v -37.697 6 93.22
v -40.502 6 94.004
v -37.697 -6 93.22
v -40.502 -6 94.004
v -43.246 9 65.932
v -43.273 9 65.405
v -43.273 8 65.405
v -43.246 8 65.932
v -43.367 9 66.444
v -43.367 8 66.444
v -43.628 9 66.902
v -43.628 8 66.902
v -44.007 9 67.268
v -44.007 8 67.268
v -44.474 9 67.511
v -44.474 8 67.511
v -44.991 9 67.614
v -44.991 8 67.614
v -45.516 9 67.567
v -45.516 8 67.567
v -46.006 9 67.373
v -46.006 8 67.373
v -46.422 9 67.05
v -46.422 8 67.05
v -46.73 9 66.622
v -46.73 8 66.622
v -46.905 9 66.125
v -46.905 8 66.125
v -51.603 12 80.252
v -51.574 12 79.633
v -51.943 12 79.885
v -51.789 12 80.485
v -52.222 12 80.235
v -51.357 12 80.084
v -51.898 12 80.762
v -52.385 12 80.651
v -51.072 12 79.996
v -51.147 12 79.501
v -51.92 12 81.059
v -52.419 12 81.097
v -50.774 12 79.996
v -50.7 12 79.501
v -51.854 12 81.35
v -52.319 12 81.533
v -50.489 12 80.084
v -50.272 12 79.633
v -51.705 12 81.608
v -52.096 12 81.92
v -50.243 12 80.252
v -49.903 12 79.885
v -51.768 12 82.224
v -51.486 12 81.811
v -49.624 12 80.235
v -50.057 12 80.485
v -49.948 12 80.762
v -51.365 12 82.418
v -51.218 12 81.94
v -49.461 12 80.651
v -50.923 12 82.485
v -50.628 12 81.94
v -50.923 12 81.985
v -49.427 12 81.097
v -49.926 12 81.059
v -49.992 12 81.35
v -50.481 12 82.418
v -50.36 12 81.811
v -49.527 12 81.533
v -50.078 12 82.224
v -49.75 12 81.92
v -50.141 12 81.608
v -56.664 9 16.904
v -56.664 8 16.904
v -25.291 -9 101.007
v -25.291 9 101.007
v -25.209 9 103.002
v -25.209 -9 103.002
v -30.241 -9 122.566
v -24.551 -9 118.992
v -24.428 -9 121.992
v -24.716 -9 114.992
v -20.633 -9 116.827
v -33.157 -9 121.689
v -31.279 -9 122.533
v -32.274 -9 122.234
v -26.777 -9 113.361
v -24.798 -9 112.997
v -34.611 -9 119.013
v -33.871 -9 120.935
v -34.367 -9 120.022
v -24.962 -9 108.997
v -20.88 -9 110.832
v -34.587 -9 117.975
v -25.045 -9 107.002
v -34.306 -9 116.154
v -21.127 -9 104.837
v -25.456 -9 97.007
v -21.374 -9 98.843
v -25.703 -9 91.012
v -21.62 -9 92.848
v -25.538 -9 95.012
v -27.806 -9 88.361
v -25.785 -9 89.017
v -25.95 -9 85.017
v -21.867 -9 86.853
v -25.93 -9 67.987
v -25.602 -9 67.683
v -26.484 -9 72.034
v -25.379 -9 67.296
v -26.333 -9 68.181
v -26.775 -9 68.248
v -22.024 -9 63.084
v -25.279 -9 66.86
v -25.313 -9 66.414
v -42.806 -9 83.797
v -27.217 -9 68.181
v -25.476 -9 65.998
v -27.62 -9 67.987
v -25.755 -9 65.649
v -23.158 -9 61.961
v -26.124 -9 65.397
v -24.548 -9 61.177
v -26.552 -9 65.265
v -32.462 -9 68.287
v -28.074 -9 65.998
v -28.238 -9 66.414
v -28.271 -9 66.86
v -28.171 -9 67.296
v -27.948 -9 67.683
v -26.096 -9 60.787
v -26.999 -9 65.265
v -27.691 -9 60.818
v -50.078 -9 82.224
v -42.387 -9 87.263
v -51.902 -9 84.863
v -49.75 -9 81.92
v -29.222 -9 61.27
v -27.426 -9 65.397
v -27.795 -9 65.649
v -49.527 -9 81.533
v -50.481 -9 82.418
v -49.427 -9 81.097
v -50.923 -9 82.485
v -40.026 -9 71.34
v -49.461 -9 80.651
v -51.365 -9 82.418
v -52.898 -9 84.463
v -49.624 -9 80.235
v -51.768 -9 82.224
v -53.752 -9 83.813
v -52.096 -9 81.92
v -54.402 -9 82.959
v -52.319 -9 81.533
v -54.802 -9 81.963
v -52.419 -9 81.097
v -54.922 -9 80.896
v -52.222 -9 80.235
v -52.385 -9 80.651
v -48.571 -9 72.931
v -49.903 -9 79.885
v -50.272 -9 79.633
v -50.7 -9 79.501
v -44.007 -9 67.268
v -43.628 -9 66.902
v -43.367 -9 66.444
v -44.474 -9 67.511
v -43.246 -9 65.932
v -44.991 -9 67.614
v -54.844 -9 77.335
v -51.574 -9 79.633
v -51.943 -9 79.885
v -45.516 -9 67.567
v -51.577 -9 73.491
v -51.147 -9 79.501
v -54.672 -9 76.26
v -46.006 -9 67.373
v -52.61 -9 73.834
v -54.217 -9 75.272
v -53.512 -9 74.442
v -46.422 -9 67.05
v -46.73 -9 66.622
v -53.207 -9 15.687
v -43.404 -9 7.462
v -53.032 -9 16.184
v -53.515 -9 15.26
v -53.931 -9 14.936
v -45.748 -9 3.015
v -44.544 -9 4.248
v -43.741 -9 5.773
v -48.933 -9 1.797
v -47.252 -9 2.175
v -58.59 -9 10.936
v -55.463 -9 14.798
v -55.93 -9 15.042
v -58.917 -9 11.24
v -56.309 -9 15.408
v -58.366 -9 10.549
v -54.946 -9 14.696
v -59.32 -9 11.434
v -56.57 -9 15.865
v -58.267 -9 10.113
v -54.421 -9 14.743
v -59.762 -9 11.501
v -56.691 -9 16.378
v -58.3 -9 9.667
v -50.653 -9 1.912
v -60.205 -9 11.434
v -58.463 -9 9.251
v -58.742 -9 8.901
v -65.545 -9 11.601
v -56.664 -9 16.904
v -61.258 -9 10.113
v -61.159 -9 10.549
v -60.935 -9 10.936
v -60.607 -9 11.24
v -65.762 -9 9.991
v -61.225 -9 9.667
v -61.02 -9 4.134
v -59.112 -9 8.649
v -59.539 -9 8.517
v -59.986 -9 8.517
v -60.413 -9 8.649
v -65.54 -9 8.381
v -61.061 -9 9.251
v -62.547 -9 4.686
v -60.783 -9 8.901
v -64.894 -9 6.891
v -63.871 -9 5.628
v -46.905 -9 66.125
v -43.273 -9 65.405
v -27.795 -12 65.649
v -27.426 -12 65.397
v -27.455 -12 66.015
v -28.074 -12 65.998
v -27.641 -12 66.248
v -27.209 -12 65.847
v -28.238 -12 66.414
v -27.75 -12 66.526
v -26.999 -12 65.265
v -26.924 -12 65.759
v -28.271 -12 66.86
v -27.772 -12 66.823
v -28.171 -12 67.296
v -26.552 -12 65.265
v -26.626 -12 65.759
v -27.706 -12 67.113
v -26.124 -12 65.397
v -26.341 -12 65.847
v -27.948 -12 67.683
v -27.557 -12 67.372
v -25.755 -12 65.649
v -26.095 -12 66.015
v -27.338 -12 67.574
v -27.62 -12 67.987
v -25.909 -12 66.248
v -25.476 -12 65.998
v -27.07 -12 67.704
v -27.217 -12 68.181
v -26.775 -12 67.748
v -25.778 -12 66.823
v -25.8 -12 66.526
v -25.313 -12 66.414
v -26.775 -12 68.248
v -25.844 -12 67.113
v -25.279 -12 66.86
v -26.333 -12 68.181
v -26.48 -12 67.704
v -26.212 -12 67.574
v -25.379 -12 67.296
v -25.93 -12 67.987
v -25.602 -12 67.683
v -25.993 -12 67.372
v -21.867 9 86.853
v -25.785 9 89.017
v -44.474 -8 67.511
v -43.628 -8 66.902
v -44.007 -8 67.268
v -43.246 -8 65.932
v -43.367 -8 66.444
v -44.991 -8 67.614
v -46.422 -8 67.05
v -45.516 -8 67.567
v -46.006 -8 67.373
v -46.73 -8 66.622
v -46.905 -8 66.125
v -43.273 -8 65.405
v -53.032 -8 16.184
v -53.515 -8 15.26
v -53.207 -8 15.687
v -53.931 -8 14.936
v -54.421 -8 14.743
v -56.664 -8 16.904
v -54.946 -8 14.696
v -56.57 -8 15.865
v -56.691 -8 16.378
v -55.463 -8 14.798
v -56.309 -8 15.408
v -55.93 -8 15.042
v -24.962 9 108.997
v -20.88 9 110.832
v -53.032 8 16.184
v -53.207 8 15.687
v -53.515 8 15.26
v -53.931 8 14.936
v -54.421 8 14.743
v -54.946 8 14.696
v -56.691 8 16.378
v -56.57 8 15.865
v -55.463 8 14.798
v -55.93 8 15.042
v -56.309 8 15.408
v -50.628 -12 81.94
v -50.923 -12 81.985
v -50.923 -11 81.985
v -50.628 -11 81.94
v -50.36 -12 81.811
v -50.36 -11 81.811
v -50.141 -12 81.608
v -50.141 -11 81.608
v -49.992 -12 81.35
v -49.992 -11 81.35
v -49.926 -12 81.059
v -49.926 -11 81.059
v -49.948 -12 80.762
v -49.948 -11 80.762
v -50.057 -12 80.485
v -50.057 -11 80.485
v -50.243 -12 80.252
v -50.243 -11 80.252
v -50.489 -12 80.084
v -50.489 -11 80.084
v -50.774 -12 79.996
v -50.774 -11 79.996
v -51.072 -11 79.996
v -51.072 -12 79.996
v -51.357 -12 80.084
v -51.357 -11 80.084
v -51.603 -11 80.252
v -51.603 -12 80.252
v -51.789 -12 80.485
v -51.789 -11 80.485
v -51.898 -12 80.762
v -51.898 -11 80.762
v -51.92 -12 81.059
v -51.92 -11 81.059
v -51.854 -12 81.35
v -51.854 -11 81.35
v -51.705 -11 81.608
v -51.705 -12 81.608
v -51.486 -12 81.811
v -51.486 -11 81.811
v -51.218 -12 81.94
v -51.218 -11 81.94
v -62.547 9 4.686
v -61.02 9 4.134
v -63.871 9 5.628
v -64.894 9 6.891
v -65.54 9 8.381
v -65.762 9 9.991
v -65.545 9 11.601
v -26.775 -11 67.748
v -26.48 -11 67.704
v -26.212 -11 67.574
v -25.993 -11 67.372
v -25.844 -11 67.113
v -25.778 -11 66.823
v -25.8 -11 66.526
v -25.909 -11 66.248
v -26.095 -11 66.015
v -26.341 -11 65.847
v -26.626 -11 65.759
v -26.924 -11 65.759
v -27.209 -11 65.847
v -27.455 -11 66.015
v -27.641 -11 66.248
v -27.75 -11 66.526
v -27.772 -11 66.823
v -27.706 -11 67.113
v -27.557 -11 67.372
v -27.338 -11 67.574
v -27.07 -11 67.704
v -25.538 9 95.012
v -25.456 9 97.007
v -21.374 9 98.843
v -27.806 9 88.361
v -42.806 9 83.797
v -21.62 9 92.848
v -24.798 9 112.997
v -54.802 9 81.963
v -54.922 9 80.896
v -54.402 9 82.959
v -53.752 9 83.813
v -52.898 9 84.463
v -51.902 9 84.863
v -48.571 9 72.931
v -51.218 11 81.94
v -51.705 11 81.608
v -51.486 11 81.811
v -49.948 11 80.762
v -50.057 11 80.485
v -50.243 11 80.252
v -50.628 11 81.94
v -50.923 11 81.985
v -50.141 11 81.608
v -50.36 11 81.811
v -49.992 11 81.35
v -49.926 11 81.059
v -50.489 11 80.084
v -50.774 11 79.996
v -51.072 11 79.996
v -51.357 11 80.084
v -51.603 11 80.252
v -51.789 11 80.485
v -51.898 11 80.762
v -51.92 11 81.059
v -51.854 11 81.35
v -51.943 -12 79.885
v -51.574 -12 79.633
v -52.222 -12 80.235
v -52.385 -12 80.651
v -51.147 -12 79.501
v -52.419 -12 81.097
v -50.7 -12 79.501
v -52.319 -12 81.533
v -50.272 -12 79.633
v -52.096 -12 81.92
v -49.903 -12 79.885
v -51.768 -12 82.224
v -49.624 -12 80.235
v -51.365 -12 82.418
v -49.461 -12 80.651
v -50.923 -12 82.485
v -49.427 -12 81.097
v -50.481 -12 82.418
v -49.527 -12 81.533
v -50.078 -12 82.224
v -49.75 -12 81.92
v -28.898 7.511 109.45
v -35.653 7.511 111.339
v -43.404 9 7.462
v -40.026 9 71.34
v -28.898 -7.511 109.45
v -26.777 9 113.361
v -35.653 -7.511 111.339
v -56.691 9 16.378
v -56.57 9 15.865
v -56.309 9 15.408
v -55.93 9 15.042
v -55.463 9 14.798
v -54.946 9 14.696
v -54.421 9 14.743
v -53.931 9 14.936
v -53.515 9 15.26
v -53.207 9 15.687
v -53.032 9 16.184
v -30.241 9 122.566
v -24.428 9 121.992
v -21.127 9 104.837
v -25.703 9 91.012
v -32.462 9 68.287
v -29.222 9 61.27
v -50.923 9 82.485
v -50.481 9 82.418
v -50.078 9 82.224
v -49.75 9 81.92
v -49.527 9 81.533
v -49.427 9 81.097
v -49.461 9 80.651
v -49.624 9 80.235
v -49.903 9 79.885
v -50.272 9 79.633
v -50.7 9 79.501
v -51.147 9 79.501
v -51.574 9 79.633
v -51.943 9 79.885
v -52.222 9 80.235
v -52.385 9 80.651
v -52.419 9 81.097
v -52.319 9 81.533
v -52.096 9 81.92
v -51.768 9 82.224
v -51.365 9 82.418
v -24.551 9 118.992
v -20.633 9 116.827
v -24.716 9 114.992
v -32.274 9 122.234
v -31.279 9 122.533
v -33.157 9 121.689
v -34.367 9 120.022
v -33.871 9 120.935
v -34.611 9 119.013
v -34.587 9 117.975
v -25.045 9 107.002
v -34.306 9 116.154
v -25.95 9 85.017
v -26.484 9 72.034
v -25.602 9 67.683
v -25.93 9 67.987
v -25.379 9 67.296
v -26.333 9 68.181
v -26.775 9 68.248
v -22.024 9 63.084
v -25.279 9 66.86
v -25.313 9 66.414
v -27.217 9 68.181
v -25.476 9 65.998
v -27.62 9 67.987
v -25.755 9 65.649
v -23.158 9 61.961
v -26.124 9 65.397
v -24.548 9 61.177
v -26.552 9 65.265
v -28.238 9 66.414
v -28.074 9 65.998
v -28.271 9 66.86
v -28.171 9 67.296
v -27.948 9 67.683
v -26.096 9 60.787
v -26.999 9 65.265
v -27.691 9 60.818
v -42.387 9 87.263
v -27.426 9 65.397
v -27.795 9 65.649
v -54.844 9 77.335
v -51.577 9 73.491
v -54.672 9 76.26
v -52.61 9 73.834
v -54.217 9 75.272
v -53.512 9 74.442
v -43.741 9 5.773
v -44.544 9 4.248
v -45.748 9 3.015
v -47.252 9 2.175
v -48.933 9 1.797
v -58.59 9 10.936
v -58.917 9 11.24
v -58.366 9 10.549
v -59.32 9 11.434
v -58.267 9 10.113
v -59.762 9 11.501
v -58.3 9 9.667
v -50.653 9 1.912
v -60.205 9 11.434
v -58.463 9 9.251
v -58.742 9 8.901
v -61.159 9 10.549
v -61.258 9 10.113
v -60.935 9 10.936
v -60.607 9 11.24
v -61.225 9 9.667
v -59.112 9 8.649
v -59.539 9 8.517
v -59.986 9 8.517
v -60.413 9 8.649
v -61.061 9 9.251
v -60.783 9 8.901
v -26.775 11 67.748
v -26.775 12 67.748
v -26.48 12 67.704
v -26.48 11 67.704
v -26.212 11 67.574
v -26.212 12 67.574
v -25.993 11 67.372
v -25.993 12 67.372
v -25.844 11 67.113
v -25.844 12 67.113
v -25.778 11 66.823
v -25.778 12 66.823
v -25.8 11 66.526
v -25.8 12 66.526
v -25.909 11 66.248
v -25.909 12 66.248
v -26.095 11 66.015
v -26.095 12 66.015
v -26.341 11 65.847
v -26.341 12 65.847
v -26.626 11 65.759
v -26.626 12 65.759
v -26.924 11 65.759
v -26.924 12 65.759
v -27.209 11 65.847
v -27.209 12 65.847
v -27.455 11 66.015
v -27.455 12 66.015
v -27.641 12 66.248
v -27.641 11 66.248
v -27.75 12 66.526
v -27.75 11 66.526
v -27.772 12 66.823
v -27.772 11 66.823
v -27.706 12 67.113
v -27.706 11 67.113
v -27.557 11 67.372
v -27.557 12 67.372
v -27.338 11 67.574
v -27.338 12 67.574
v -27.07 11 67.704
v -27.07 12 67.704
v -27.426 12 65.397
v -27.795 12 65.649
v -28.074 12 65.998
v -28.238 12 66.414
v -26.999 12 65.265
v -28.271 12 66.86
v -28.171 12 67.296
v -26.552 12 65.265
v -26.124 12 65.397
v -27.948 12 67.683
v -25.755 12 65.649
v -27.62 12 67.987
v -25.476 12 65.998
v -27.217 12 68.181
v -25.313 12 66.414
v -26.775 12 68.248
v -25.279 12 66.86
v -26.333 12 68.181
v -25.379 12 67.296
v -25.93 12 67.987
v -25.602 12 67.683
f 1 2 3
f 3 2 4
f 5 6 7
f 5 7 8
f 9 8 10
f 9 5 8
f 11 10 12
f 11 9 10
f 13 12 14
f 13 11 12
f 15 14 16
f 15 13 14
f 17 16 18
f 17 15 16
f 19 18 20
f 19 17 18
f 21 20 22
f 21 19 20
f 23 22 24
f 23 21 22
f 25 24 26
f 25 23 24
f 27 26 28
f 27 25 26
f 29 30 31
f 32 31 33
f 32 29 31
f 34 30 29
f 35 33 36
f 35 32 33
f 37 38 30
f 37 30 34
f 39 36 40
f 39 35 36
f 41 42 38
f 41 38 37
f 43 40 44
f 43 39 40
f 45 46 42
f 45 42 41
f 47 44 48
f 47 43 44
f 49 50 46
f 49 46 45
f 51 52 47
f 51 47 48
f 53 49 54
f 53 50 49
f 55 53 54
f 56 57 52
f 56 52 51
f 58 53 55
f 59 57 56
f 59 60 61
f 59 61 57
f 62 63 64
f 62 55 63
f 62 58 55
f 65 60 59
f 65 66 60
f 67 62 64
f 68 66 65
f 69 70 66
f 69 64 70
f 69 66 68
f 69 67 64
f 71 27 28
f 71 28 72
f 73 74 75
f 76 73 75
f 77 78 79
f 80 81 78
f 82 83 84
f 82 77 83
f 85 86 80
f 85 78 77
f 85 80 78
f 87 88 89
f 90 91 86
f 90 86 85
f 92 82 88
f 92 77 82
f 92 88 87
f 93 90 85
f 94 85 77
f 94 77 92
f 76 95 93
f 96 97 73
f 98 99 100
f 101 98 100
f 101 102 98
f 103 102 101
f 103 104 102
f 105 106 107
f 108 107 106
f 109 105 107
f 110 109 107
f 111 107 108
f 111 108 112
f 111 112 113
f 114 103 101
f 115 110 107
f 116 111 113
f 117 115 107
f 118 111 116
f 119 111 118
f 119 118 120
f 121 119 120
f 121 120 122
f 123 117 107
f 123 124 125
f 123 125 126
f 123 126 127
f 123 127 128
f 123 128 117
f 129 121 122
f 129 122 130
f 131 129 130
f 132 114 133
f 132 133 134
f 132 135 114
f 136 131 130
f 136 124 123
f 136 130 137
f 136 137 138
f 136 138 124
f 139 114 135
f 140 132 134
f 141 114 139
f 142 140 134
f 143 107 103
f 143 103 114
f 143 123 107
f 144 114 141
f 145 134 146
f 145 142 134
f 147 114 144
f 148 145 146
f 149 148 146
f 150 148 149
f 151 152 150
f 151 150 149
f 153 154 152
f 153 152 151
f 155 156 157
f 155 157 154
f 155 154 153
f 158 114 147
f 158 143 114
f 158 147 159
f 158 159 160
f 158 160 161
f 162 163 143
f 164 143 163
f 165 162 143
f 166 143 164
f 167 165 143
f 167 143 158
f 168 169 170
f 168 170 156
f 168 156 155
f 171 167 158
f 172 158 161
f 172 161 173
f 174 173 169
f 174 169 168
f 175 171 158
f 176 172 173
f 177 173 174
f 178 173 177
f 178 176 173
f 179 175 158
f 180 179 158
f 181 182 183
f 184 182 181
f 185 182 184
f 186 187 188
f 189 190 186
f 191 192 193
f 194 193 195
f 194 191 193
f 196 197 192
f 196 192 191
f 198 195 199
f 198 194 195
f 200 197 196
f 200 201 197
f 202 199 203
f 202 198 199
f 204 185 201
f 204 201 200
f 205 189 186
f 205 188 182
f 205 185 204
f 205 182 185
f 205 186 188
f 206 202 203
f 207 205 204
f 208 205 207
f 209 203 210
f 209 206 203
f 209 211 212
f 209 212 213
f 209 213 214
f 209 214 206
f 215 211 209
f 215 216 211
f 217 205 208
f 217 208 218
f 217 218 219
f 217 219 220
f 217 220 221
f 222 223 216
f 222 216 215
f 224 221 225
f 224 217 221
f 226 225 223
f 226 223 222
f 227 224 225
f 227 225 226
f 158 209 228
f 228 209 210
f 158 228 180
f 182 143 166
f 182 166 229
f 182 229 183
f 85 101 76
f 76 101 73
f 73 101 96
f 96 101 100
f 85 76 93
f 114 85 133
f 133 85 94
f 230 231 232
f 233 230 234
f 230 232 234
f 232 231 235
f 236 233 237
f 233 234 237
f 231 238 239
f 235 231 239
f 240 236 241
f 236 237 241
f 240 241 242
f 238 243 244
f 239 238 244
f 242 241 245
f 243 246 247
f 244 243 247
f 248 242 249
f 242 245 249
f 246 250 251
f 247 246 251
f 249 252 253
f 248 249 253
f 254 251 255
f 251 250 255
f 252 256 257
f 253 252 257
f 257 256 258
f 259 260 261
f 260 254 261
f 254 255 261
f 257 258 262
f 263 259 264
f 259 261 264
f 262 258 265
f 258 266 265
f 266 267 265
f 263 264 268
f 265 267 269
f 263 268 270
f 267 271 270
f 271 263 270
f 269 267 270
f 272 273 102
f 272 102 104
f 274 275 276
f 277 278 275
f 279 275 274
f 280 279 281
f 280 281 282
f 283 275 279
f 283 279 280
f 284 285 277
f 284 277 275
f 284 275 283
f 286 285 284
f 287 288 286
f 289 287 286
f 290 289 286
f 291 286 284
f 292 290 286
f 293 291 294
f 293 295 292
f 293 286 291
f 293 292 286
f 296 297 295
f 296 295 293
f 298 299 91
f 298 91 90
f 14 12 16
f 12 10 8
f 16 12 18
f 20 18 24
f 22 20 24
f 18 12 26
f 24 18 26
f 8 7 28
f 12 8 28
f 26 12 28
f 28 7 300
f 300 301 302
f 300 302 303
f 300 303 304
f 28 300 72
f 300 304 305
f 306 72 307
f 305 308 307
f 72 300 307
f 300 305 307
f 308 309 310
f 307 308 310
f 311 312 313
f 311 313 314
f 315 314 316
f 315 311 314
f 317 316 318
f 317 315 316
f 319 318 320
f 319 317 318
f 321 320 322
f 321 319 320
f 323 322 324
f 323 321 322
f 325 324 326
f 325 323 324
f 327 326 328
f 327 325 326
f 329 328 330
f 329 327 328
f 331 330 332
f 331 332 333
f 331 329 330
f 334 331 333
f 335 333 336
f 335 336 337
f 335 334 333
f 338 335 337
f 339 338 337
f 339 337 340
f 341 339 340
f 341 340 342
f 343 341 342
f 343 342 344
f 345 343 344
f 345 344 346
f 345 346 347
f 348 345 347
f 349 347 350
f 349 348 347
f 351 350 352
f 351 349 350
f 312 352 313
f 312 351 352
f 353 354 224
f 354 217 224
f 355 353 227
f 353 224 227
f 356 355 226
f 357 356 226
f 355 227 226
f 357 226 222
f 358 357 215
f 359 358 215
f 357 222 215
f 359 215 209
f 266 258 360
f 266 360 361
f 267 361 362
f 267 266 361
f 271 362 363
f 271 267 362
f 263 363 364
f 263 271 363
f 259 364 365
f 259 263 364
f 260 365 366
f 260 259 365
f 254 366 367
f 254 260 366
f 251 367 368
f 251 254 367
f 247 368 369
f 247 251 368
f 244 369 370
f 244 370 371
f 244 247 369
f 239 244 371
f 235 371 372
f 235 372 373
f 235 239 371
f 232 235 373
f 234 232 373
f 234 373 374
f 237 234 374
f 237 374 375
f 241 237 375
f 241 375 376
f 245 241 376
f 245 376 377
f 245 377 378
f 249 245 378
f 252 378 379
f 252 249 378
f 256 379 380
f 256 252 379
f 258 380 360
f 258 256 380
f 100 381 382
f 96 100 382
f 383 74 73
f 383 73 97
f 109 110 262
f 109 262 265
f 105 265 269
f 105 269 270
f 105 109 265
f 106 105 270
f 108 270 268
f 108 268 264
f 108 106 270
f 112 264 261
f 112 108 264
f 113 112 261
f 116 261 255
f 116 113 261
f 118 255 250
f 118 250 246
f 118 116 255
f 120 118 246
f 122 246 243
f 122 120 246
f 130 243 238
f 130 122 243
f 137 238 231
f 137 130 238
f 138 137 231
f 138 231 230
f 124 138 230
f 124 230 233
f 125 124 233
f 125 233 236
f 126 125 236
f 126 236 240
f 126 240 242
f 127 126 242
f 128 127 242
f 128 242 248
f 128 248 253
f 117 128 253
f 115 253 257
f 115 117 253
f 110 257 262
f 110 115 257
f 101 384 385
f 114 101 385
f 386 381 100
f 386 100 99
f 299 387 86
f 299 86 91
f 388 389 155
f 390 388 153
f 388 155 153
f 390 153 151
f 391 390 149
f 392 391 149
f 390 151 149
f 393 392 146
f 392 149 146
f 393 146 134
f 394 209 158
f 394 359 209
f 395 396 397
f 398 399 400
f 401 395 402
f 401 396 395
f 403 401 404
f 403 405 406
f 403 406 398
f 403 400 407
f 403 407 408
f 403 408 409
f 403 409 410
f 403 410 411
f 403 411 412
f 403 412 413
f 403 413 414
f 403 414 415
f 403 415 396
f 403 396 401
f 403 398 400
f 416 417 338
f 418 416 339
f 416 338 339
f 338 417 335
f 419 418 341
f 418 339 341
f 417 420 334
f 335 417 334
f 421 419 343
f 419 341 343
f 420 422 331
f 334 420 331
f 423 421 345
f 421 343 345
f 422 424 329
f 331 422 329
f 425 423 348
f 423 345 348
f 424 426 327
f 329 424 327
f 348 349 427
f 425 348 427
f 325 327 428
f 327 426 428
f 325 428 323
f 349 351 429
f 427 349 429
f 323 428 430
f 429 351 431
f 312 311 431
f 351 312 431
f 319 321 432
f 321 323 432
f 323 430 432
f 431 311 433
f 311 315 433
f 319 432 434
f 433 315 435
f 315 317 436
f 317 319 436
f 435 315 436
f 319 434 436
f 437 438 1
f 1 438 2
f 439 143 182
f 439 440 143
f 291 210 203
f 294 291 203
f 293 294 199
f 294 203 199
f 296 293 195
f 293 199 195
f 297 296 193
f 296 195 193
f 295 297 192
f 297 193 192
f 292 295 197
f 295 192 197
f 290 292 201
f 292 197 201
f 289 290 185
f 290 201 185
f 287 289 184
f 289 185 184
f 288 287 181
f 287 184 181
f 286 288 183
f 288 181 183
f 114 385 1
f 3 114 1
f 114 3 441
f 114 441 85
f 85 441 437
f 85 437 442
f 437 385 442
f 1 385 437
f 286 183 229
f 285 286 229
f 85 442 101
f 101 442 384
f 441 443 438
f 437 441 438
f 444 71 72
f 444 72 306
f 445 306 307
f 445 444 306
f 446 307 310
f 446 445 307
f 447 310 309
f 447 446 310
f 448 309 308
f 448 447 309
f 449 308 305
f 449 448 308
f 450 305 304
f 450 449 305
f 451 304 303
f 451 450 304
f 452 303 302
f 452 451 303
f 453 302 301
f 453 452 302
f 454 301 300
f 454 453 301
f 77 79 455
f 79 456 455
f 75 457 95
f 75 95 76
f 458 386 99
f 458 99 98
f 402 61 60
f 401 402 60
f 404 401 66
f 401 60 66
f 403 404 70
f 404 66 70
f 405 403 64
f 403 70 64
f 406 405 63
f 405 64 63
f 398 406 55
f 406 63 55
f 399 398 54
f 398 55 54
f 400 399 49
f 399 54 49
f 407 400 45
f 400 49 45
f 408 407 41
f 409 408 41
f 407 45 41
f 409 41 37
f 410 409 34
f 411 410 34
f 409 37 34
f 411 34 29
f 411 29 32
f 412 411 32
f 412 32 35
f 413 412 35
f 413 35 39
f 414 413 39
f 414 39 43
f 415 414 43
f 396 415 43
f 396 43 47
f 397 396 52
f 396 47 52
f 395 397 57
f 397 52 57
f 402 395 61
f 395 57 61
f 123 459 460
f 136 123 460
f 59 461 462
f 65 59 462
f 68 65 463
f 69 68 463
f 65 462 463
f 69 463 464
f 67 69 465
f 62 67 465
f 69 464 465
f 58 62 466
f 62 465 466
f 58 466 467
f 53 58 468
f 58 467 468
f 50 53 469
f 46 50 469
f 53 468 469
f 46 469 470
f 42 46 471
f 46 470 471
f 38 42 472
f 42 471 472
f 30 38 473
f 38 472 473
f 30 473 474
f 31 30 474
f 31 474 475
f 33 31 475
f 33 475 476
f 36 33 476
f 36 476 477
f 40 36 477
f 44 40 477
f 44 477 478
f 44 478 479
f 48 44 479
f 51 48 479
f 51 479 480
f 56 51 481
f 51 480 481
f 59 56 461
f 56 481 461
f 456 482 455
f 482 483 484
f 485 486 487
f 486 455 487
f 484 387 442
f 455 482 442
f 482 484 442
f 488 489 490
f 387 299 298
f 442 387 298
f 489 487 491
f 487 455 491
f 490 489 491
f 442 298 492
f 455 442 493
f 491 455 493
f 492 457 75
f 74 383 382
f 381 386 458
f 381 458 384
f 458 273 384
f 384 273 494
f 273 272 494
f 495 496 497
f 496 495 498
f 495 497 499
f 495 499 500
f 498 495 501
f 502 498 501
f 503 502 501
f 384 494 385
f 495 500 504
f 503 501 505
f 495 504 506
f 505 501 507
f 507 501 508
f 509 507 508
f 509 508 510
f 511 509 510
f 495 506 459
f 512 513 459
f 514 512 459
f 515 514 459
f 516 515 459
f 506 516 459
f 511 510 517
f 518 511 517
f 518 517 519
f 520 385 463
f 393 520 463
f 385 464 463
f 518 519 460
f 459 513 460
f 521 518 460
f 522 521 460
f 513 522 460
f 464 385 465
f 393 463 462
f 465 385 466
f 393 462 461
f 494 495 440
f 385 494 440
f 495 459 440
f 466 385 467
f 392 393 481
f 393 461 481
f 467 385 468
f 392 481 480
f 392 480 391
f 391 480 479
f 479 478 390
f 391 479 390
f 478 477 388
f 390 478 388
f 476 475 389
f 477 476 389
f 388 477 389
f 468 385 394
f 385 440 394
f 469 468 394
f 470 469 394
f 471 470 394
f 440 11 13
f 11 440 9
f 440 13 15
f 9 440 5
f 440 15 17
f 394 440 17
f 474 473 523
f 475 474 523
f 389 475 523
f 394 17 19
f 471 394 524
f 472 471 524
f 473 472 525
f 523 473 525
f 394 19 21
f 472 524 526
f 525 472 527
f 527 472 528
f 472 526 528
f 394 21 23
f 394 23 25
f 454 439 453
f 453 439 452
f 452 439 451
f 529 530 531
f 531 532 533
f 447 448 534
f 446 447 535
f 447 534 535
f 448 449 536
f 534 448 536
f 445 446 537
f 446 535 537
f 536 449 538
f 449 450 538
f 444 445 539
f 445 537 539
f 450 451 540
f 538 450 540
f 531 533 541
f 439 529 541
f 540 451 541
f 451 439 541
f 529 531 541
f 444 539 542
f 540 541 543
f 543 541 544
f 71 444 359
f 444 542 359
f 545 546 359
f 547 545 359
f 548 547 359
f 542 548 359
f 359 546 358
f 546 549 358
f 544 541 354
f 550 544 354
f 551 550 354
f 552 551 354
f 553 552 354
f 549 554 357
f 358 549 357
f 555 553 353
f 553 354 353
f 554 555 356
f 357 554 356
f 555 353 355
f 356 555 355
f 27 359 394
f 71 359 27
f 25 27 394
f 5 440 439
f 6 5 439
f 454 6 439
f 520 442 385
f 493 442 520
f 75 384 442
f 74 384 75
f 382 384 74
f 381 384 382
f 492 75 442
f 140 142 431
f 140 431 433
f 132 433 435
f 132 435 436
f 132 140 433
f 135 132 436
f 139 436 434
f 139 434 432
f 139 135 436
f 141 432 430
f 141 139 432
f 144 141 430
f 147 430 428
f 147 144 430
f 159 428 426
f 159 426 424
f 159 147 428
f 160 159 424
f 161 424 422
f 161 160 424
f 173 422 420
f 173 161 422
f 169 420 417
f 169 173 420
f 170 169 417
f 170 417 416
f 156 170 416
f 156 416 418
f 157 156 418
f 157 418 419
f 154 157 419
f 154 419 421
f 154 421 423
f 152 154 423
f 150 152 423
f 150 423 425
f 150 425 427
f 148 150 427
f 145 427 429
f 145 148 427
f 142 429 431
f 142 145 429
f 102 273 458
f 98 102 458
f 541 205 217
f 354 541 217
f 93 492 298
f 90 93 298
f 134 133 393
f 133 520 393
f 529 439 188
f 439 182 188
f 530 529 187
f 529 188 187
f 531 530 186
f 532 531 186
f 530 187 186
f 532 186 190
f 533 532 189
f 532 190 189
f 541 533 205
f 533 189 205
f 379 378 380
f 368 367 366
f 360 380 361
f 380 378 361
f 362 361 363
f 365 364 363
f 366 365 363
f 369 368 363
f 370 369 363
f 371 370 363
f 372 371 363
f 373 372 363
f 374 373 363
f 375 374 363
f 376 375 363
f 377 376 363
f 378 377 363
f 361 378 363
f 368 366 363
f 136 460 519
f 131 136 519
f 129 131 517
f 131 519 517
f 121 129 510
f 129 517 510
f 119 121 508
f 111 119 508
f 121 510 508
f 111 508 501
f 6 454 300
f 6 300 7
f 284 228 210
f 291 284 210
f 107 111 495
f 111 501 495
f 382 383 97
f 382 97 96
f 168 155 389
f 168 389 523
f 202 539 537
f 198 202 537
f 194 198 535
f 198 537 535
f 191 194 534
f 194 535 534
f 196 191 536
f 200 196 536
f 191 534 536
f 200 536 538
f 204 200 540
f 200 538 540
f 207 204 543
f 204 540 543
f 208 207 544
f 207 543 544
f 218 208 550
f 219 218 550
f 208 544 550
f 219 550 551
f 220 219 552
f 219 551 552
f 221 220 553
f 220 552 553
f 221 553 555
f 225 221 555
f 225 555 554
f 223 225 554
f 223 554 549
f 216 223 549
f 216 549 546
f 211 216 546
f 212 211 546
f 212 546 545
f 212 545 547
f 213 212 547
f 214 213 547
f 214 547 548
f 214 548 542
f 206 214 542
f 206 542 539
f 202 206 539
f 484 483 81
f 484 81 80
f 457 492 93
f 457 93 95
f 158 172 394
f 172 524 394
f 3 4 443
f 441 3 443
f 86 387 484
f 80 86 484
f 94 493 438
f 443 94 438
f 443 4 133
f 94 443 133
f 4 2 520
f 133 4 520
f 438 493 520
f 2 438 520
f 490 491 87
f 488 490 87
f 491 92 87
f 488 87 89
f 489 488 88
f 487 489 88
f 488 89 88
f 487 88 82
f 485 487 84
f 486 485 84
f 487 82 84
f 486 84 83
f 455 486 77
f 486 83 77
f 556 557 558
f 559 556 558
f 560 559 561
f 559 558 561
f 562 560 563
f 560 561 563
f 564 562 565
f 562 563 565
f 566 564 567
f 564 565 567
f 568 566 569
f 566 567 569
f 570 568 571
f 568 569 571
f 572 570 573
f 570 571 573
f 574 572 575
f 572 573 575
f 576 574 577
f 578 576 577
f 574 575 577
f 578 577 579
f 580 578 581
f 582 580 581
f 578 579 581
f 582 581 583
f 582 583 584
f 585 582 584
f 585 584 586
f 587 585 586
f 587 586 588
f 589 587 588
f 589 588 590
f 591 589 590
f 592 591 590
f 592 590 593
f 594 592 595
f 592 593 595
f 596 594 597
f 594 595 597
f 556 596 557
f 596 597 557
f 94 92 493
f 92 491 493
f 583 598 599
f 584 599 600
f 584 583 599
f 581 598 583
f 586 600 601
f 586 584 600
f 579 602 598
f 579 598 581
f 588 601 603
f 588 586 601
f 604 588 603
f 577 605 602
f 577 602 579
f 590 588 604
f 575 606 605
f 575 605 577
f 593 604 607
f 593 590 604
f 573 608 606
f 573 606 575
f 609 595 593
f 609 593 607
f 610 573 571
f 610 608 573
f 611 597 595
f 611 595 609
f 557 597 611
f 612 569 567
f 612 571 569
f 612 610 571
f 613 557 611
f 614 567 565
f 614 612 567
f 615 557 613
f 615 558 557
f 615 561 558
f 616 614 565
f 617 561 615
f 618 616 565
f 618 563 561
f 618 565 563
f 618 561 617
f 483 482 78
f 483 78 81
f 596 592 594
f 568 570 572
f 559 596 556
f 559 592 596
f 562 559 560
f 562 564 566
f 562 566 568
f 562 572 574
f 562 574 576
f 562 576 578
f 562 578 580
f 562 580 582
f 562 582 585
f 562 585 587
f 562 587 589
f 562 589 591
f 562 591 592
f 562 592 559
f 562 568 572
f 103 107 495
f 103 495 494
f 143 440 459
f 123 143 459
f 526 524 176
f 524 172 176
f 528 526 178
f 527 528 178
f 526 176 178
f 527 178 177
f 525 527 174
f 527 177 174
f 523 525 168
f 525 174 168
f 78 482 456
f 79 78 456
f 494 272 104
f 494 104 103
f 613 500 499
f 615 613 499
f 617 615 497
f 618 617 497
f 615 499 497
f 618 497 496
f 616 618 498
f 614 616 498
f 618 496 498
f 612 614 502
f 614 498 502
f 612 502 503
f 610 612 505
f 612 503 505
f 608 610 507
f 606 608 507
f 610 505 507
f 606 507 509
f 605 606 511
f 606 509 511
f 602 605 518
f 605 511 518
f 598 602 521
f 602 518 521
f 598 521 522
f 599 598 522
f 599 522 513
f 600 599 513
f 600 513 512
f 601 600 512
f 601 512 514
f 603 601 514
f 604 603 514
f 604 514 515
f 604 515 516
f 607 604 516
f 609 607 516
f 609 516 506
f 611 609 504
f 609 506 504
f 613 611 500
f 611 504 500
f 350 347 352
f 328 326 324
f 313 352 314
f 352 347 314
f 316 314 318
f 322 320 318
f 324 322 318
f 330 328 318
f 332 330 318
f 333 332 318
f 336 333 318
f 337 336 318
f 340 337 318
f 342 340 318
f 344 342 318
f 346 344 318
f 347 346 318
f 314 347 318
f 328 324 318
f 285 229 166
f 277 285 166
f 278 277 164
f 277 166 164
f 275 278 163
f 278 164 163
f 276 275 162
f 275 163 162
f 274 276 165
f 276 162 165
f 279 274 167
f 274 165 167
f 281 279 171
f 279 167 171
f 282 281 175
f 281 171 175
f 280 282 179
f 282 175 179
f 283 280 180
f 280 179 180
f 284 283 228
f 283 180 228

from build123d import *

# Parameters (mm, degrees)
BOSS_EXTRUDE2_DEPTH = 9
FILLET2_R           = 6
FILLET3_R           = 4
BOSS_EXTRUDE3_DEPTH = 18
LPATTERN1_COUNT     = 6
LPATTERN1_PITCH     = 6
CUT_EXTRUDE1_DEPTH  = 26
CUT_EXTRUDE2_DEPTH  = 8
SKETCH6_R           = 1.5
CUT_EXTRUDE3_DEPTH  = 141.270424647
SKETCH7_R           = 1.5
BOSS_EXTRUDE4_DEPTH = 3
SKETCH8_R           = 1
CUT_EXTRUDE4_DEPTH  = 1
SKETCH9_R           = 1
CUT_EXTRUDE5_DEPTH  = 1
CUT_EXTRUDE6_DEPTH  = 1


with BuildPart() as part:
    # Sketch2 → Boss-Extrude2 (new, symmetric)
    with BuildSketch(Plane(origin=(0, 0, 0), x_dir=(1, 0, 0), z_dir=(0, 1, 0))):
        with BuildLine():
            ThreePointArc((-29.221908411, -61.269670629), (-25.308747509, -60.930081396), (-22.024034304, -63.083870674))
            Line((-22.024034304, -63.083870674), (-26.48393122, -72.034251644))
            Line((-26.48393122, -72.034251644), (-24.427510733, -121.991945093))
            Line((-24.427510733, -121.991945093), (-35.374328657, -123.072304919))
            Line((-35.374328657, -123.072304919), (-34.306141095, -116.154286754))
            Line((-34.306141095, -116.154286754), (-42.387240047, -87.26318363))
            Line((-42.387240047, -87.26318363), (-54.992342236, -84.083341057))
            Line((-54.992342236, -84.083341057), (-54.772056901, -74.085767632))
            Line((-54.772056901, -74.085767632), (-40.025552486, -71.339750966))
            Line((-40.025552486, -71.339750966), (-32.461637172, -68.287082299))
            Line((-32.461637172, -68.287082299), (-29.221908411, -61.269670629))
        make_face()
        Polygon((-40.025552486, -71.339750966), (-43.775331208, -0.438840115), (-67.242664489, -5.467186629), (-48.571202968, -72.931077154), align=None)
    extrude(amount=BOSS_EXTRUDE2_DEPTH, both=True)

    # Fillet2
    fillet2_edges = [part.edges().sort_by_distance(p)[0] for p in [
        (-67.242664489, 0, 5.467186629),
        (-43.775331208, 0, 0.438840115),
    ]]
    fillet(fillet2_edges, radius=FILLET2_R)

    # Fillet3
    fillet3_edges = [part.edges().sort_by_distance(p)[0] for p in [
        (-35.374328657, 0, 123.072304919),
        (-54.992342236, 0, 84.083341057),
        (-54.772056901, 0, 74.085767632),
    ]]
    fillet(fillet3_edges, radius=FILLET3_R)

    # Sketch3 → Boss-Extrude3 (add)
    with BuildSketch(Plane(origin=(0, 9, 0), x_dir=(1, 0, 0), z_dir=(0, 1, 0))):
        Polygon((-24.715653408, -114.991945093), (-24.633326929, -116.991945093), (-20.633326929, -116.827292136), align=None)
        Polygon((-24.633326929, -116.991945093), (-24.551000451, -118.991945093), (-20.633326929, -116.827292136), align=None)
    boss_extrude3 = extrude(amount=-BOSS_EXTRUDE3_DEPTH)

    # LPattern1: Boss-Extrude3 ×6
    with Locations(*[Vector(-0.04112840973087357, 0, -0.9991538689876598) * (i * LPATTERN1_PITCH) for i in range(1, LPATTERN1_COUNT)]):
        add(boss_extrude3)

    # Sketch4 → Cut-Extrude1 (cut)
    with BuildSketch(Plane(origin=(0, 9, 0), x_dir=(1, 0, 0), z_dir=(0, 1, 0))):
        Polygon((-26.777262548, -113.360971375), (-27.806343529, -88.360971375), (-42.806343529, -83.797470899), align=None)
    extrude(amount=-CUT_EXTRUDE1_DEPTH, mode=Mode.SUBTRACT)

    # Sketch5 → Cut-Extrude2 (cut)
    with BuildSketch(Plane(origin=(-61.948834437, 0, 17.327640931), x_dir=(0.2693699650610515, 0, 0.9630367708052524), z_dir=(-0.9630367708052524, 0, 0.2693699650610515))):
        Polygon((79.619805202, 6), (79.619805202, -6), (97.619805202, -7.510612388), (97.619805202, 7.510612388), align=None)
    extrude(amount=-CUT_EXTRUDE2_DEPTH, mode=Mode.SUBTRACT)

    # Sketch6 → Cut-Extrude3 (cut, through all)
    with BuildSketch(Plane(origin=(0, 9, 0), x_dir=(1, 0, 0), z_dir=(0, 1, 0))):
        with Locations(Location((-59.762437454, -10.000587386, 0), (0, 0, 270))):
            Circle(SKETCH6_R)
    extrude(amount=-CUT_EXTRUDE3_DEPTH, mode=Mode.SUBTRACT)

    # Sketch7 → Boss-Extrude4 (add)
    with BuildSketch(Plane(origin=(0, 9, 0), x_dir=(1, 0, 0), z_dir=(0, 1, 0))):
        with Locations(Location((-26.77516561, -66.748123847, 0), (0, 0, 270))):
            Circle(SKETCH7_R)
        with Locations(Location((-50.92309324, -80.984561831, 0), (0, 0, 270))):
            Circle(SKETCH7_R)
    boss_extrude4 = extrude(amount=BOSS_EXTRUDE4_DEPTH)

    # Sketch8 → Cut-Extrude4 (cut)
    with BuildSketch(Plane(origin=(0, 12, 0), x_dir=(1, 0, 0), z_dir=(0, 1, 0))):
        with Locations(Location((-50.92309324, -80.984561831, 0), (0, 0, 270))):
            Circle(SKETCH8_R)
    cut_extrude4 = extrude(amount=-CUT_EXTRUDE4_DEPTH, mode=Mode.SUBTRACT)

    # Sketch9 → Cut-Extrude5 (cut)
    with BuildSketch(Plane(origin=(0, 12, 0), x_dir=(1, 0, 0), z_dir=(0, 1, 0))):
        with Locations(Location((-26.77516561, -66.748123847, 0), (0, 0, 270))):
            Circle(SKETCH9_R)
    cut_extrude5 = extrude(amount=-CUT_EXTRUDE5_DEPTH, mode=Mode.SUBTRACT)

    # Sketch10 → Cut-Extrude6 (cut)
    with BuildSketch(Plane(origin=(0, 9, 0), x_dir=(1, 0, 0), z_dir=(0, 1, 0))):
        with BuildLine():
            Line((-53.032104668, -16.184151081), (-43.273460306, -65.40538361))
            ThreePointArc((-43.273460306, -65.40538361), (-44.729227788, -67.581140215), (-46.904984392, -66.125372733))
            Line((-46.904984392, -66.125372733), (-56.663628755, -16.904140204))
            ThreePointArc((-56.663628755, -16.904140204), (-55.207861273, -14.728383599), (-53.032104668, -16.184151081))
        make_face()
    cut_extrude6 = extrude(amount=-CUT_EXTRUDE6_DEPTH, mode=Mode.SUBTRACT)

    # Mirror1: Boss-Extrude4, Cut-Extrude4, Cut-Extrude5, Cut-Extrude6 across plane
    add(boss_extrude4.mirror(Plane.ZX))
    add(cut_extrude4.mirror(Plane.ZX), mode=Mode.SUBTRACT)
    add(cut_extrude5.mirror(Plane.ZX), mode=Mode.SUBTRACT)
    add(cut_extrude6.mirror(Plane.ZX), mode=Mode.SUBTRACT)


solid = part.part
